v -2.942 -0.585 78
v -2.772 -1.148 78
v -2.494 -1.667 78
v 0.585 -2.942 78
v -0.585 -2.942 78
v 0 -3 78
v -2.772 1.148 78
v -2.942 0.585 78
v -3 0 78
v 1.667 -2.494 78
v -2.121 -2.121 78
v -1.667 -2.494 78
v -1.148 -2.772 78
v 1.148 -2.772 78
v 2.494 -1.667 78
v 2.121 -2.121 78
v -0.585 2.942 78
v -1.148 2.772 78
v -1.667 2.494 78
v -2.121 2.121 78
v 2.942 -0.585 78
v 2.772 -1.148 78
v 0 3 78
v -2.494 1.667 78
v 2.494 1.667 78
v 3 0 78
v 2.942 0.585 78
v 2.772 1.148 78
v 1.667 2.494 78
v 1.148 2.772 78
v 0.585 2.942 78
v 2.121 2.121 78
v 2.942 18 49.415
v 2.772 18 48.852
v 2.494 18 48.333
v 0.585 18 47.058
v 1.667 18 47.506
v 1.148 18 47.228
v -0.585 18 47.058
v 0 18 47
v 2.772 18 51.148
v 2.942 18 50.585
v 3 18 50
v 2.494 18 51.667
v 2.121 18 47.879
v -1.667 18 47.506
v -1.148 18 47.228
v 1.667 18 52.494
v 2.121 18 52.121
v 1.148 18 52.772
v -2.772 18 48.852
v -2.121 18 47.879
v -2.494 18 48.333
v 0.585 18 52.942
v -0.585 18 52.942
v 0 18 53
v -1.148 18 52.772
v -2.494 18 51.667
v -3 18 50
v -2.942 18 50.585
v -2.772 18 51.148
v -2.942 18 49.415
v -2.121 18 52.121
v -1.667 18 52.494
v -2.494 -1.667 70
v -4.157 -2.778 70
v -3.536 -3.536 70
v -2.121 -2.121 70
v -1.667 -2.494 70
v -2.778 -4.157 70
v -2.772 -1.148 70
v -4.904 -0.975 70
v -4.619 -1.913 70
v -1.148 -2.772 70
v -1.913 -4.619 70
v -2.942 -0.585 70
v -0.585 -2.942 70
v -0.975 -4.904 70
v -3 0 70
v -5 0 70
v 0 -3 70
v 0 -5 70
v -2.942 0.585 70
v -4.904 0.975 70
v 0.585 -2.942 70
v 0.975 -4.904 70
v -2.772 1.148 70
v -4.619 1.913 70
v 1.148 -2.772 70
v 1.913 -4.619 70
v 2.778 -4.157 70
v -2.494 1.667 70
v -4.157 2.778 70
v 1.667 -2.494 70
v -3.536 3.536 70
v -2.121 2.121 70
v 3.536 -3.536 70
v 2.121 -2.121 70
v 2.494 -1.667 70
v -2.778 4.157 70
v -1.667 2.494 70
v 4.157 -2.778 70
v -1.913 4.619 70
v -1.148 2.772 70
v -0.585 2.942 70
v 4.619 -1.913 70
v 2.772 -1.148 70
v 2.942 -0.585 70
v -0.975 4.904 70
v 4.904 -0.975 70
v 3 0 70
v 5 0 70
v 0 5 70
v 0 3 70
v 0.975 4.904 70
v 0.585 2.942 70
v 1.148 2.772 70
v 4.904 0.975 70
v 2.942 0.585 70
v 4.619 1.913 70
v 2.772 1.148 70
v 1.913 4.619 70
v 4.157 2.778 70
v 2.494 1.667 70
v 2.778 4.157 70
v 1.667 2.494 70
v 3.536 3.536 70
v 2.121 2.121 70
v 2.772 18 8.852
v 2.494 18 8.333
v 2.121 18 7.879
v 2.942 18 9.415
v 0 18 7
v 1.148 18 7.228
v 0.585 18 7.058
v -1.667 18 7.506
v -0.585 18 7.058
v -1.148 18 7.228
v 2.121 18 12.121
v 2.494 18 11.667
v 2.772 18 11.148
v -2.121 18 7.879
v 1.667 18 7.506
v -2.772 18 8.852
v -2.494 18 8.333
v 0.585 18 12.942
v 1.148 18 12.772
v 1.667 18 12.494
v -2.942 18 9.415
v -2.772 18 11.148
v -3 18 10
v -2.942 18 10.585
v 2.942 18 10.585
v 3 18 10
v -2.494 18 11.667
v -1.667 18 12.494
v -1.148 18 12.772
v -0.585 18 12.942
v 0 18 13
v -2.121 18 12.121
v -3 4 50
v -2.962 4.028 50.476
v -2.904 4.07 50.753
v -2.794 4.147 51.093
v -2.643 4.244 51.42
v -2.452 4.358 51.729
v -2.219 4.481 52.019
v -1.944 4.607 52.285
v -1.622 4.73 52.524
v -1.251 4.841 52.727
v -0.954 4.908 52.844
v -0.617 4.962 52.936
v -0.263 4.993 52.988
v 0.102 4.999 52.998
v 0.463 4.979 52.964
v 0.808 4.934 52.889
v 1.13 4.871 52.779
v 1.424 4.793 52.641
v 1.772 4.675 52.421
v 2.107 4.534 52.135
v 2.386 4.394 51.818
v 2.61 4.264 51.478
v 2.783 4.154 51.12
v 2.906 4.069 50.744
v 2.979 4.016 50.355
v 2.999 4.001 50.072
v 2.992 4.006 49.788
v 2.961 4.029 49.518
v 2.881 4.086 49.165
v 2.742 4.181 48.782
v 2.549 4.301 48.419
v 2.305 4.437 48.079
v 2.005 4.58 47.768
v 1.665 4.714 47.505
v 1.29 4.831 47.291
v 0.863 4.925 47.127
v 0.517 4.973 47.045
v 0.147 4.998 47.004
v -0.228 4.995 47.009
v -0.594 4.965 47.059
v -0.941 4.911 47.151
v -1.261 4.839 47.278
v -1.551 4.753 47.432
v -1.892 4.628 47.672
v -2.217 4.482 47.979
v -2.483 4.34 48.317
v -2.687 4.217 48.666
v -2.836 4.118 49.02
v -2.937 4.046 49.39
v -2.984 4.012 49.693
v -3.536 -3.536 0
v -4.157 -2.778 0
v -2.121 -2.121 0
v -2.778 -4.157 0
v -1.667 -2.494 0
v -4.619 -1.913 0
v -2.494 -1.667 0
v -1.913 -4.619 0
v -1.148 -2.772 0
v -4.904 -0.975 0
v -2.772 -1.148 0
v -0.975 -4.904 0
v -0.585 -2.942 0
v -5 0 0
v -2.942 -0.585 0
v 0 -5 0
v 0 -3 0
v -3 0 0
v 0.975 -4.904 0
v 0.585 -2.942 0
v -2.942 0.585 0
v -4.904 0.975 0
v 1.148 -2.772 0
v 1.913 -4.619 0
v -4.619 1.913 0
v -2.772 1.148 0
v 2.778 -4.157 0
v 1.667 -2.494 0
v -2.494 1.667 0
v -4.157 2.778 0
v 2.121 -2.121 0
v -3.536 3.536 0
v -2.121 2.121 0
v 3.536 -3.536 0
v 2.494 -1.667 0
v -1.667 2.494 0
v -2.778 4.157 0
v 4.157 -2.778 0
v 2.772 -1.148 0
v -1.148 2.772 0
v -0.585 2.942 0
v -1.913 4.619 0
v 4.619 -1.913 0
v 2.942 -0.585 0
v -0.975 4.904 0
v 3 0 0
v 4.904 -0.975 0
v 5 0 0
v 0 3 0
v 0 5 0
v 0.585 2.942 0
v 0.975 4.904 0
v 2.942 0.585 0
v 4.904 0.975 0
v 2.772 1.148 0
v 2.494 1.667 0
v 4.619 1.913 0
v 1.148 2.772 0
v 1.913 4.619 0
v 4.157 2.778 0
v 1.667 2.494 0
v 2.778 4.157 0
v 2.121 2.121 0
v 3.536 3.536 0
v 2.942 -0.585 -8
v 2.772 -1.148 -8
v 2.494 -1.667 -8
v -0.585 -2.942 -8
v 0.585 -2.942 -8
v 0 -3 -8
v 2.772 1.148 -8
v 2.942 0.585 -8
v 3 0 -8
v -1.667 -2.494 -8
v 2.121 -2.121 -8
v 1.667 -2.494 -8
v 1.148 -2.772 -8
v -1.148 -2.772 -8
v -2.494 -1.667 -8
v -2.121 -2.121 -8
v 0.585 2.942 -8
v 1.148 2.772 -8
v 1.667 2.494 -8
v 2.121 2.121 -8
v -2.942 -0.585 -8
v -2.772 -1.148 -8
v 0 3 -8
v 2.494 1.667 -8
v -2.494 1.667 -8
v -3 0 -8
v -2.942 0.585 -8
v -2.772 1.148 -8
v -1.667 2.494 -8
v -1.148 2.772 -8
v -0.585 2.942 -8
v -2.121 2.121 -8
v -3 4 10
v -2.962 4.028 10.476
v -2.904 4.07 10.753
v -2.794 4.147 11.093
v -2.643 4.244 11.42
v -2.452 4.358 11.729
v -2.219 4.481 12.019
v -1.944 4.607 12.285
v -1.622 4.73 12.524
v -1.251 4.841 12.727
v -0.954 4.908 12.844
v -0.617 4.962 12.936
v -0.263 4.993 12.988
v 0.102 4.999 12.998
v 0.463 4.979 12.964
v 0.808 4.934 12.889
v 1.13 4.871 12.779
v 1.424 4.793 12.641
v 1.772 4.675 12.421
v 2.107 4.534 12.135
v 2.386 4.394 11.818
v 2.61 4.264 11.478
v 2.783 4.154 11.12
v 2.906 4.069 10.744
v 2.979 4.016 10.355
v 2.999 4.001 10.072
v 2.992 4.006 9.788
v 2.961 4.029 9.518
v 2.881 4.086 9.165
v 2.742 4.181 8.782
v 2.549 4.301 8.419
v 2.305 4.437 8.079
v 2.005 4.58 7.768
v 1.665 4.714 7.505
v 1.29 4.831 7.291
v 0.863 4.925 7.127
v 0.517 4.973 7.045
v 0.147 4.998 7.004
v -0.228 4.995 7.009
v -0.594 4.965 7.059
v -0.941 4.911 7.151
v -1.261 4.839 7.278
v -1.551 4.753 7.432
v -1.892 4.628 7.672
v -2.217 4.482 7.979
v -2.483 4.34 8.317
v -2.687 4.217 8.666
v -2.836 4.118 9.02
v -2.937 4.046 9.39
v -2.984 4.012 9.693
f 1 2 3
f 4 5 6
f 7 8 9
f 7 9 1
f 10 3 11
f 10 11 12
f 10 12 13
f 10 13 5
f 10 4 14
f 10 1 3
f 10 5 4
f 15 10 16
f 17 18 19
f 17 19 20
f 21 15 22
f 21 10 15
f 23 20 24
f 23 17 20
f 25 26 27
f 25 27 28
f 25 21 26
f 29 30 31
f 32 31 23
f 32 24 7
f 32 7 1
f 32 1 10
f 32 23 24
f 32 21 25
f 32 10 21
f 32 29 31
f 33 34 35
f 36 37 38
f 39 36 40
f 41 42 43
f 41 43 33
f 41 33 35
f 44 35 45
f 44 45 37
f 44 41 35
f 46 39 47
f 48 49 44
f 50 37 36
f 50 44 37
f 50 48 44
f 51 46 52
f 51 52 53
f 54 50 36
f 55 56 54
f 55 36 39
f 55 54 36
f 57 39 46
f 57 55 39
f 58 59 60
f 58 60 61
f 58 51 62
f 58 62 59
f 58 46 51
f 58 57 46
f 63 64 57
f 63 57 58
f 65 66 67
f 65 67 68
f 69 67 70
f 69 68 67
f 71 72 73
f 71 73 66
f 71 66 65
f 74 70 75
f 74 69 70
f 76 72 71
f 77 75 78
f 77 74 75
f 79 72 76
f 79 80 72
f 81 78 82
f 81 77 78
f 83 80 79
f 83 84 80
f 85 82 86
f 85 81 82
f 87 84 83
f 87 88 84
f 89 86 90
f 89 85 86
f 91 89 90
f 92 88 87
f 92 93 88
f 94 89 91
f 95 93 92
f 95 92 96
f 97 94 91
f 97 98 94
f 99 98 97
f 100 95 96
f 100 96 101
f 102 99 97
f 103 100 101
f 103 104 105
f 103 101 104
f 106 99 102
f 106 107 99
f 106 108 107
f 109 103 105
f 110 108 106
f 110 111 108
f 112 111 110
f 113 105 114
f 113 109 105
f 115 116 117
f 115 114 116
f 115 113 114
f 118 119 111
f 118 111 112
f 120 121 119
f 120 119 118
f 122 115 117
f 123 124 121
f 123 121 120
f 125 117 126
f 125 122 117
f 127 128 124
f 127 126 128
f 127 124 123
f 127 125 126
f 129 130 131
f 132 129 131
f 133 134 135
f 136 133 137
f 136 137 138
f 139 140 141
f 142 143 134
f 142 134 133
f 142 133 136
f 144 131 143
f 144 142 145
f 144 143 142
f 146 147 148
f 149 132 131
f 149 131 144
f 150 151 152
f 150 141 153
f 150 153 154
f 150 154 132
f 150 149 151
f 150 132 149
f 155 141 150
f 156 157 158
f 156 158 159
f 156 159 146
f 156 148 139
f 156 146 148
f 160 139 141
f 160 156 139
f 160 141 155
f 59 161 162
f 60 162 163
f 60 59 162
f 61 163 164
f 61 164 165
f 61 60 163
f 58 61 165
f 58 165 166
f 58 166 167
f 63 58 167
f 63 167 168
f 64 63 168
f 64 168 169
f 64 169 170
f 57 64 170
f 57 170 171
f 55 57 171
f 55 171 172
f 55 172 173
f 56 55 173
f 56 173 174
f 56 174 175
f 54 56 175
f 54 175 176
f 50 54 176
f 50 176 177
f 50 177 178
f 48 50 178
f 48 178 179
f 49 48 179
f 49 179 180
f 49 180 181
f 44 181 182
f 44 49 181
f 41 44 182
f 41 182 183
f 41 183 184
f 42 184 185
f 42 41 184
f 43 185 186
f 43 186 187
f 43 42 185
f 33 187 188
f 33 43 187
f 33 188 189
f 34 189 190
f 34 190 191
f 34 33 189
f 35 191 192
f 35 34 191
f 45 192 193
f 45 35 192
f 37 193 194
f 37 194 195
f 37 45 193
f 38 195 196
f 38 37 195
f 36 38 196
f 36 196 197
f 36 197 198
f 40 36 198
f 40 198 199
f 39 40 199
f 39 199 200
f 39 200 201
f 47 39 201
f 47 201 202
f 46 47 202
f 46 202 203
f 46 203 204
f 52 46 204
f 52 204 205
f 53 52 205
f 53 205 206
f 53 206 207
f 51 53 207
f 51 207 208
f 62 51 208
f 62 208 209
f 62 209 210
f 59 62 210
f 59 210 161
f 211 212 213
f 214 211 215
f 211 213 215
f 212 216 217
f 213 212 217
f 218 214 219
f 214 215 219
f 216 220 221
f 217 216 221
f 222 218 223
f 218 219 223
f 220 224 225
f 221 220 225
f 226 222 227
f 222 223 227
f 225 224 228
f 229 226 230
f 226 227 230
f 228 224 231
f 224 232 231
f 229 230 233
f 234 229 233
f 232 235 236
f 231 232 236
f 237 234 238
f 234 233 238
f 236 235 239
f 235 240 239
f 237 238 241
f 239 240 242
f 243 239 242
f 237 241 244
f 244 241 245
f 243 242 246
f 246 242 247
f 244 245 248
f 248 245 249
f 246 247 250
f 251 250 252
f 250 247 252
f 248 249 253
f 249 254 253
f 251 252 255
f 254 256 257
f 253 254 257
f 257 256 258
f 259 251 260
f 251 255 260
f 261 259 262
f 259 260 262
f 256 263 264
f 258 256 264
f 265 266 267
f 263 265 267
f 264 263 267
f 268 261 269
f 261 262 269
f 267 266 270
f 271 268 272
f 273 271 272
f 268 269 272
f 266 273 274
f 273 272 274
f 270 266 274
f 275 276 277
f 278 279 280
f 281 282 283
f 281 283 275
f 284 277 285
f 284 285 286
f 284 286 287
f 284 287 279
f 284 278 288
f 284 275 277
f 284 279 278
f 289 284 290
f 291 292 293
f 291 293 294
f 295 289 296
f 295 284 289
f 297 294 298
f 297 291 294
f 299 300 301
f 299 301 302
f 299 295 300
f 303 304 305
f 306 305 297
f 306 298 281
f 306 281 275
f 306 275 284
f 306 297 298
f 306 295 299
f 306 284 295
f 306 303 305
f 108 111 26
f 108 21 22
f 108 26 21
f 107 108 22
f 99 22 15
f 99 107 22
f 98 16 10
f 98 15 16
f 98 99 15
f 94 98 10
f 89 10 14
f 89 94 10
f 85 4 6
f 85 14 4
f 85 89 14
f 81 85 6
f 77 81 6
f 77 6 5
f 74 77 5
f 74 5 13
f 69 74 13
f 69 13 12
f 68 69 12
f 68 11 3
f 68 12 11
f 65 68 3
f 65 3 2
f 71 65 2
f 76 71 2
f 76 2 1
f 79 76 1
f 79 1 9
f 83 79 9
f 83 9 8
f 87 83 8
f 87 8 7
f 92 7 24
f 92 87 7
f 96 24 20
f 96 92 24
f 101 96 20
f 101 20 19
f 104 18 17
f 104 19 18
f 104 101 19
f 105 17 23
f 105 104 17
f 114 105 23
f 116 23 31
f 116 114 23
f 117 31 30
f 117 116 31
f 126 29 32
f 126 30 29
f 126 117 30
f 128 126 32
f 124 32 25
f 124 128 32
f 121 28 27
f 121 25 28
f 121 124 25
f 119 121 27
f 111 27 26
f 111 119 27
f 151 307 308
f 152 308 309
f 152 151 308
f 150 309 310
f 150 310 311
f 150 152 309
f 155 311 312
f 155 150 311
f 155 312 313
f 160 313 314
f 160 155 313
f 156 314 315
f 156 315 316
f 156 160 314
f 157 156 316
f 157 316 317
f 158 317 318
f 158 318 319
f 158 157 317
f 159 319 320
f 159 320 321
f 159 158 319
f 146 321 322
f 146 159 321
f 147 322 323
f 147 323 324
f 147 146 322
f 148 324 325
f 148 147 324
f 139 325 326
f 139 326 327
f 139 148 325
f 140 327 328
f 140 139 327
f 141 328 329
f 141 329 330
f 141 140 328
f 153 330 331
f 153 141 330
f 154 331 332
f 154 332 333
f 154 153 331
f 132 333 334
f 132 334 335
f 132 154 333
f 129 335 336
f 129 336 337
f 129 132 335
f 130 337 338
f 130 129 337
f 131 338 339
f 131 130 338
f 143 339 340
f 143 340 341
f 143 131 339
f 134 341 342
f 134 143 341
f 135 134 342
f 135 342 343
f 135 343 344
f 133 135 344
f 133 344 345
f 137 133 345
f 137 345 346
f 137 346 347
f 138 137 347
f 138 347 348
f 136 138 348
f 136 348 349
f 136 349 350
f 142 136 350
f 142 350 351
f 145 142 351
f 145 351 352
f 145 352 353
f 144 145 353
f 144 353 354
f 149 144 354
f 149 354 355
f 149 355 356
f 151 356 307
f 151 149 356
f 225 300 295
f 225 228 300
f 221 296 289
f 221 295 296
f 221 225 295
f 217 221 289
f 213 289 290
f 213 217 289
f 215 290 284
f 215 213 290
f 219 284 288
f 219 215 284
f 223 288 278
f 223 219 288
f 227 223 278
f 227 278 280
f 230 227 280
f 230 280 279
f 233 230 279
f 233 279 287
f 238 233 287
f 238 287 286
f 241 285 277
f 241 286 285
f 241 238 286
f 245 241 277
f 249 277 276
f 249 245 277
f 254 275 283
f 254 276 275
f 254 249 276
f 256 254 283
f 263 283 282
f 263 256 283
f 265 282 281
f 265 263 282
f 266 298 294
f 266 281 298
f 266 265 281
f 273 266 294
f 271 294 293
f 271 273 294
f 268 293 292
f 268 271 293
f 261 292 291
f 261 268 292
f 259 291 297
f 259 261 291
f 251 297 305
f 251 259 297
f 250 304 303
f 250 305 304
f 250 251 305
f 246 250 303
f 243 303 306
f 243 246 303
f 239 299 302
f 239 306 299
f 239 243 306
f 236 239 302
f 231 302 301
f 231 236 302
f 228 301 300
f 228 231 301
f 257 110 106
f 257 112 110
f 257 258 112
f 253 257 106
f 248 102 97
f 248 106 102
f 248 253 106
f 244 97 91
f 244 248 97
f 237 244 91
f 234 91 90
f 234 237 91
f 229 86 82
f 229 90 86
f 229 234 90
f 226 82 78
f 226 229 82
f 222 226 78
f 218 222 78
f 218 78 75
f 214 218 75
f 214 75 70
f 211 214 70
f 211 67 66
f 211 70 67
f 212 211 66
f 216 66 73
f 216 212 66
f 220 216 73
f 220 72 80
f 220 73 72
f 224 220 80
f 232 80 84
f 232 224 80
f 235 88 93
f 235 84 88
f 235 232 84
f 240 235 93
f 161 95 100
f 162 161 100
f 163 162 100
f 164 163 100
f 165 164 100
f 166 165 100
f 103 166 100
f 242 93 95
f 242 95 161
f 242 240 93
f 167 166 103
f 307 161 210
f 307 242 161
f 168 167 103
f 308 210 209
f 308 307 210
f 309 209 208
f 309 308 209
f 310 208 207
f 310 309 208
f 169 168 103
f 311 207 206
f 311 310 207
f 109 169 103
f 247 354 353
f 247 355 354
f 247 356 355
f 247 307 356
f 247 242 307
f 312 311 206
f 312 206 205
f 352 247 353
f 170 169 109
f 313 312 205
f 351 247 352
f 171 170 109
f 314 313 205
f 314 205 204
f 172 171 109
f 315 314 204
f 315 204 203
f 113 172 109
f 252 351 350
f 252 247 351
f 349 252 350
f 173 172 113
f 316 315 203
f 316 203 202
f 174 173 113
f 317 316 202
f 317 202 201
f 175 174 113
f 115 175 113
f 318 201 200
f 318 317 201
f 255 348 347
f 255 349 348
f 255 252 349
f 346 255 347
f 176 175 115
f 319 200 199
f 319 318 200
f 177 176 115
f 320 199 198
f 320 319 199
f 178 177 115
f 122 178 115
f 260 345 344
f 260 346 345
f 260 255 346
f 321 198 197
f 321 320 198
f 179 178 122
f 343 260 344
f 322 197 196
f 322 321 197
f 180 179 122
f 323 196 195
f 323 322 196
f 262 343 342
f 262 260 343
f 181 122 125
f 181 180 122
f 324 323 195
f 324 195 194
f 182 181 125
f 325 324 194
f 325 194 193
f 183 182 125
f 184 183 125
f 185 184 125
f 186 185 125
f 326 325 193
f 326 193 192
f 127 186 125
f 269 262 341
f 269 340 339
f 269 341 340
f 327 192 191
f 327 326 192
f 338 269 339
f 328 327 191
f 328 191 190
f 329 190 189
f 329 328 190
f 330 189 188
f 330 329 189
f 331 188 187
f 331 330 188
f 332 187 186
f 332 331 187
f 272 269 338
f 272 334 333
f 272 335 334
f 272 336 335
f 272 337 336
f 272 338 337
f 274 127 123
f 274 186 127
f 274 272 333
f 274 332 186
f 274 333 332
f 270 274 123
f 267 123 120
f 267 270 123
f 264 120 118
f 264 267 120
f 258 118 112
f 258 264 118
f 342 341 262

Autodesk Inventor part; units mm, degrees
ref_plane "YZ Plane" through (0, 0, 0) normal (1, 0, 0) x (0, 1, 0)
ref_plane "XY Plane" through (0, 0, 0) normal (0, 0, 1) x (1, 0, 0)
sketch "Sketch1" plane through (0, 0, 0) normal (0, 0, 1) x (1, 0, 0)
  circle A0 centre (0, 0) radius 5
  dimension "d0" = 10
extrude "Extrusion1" add sketch "Sketch1" along normal blind 70
sketch "Sketch2" plane through (0, 0, 70) normal (0, 0, 1) x (1, 0, 0)
  circle A0 centre (0, 0) radius 3
  dimension "d3" = 6
extrude "Extrusion2" add sketch "Sketch2" along normal blind 8
sketch "Sketch3" plane through (0, 0, 0) normal (0, 0, -1) x (-1, 0, 0)
  circle A0 centre (0, 0) radius 3 projected
  circle A1 centre (0, 0) radius 3
  dimension "d6" = 6
extrude "Extrusion3" add sketch "Sketch3" along normal blind 8
ref_plane "Work Plane1" through (0, 18, 0) normal (0, 1, 0) x (-1, 0, 0)
sketch "Sketch4" plane through (0, 18, 0) normal (0, 1, 0) x (-1, 0, 0)
  circle A0 centre (0, 10) radius 3
  circle A1 centre (0, 50) radius 3
  line L0 (5, 0) -> (5, 70) projected
  line L1 (5, 35) -> (17.3974, 35) construction
  point P0 (0, 0)
  dimension "d10" = 6
  dimension "d11" = 6
  dimension "d12" = 40
  dimension "d13" = 10
extrude "Extrusion4" add sketch "Sketch4" against normal up to surface
properties part number "verbindung2"
